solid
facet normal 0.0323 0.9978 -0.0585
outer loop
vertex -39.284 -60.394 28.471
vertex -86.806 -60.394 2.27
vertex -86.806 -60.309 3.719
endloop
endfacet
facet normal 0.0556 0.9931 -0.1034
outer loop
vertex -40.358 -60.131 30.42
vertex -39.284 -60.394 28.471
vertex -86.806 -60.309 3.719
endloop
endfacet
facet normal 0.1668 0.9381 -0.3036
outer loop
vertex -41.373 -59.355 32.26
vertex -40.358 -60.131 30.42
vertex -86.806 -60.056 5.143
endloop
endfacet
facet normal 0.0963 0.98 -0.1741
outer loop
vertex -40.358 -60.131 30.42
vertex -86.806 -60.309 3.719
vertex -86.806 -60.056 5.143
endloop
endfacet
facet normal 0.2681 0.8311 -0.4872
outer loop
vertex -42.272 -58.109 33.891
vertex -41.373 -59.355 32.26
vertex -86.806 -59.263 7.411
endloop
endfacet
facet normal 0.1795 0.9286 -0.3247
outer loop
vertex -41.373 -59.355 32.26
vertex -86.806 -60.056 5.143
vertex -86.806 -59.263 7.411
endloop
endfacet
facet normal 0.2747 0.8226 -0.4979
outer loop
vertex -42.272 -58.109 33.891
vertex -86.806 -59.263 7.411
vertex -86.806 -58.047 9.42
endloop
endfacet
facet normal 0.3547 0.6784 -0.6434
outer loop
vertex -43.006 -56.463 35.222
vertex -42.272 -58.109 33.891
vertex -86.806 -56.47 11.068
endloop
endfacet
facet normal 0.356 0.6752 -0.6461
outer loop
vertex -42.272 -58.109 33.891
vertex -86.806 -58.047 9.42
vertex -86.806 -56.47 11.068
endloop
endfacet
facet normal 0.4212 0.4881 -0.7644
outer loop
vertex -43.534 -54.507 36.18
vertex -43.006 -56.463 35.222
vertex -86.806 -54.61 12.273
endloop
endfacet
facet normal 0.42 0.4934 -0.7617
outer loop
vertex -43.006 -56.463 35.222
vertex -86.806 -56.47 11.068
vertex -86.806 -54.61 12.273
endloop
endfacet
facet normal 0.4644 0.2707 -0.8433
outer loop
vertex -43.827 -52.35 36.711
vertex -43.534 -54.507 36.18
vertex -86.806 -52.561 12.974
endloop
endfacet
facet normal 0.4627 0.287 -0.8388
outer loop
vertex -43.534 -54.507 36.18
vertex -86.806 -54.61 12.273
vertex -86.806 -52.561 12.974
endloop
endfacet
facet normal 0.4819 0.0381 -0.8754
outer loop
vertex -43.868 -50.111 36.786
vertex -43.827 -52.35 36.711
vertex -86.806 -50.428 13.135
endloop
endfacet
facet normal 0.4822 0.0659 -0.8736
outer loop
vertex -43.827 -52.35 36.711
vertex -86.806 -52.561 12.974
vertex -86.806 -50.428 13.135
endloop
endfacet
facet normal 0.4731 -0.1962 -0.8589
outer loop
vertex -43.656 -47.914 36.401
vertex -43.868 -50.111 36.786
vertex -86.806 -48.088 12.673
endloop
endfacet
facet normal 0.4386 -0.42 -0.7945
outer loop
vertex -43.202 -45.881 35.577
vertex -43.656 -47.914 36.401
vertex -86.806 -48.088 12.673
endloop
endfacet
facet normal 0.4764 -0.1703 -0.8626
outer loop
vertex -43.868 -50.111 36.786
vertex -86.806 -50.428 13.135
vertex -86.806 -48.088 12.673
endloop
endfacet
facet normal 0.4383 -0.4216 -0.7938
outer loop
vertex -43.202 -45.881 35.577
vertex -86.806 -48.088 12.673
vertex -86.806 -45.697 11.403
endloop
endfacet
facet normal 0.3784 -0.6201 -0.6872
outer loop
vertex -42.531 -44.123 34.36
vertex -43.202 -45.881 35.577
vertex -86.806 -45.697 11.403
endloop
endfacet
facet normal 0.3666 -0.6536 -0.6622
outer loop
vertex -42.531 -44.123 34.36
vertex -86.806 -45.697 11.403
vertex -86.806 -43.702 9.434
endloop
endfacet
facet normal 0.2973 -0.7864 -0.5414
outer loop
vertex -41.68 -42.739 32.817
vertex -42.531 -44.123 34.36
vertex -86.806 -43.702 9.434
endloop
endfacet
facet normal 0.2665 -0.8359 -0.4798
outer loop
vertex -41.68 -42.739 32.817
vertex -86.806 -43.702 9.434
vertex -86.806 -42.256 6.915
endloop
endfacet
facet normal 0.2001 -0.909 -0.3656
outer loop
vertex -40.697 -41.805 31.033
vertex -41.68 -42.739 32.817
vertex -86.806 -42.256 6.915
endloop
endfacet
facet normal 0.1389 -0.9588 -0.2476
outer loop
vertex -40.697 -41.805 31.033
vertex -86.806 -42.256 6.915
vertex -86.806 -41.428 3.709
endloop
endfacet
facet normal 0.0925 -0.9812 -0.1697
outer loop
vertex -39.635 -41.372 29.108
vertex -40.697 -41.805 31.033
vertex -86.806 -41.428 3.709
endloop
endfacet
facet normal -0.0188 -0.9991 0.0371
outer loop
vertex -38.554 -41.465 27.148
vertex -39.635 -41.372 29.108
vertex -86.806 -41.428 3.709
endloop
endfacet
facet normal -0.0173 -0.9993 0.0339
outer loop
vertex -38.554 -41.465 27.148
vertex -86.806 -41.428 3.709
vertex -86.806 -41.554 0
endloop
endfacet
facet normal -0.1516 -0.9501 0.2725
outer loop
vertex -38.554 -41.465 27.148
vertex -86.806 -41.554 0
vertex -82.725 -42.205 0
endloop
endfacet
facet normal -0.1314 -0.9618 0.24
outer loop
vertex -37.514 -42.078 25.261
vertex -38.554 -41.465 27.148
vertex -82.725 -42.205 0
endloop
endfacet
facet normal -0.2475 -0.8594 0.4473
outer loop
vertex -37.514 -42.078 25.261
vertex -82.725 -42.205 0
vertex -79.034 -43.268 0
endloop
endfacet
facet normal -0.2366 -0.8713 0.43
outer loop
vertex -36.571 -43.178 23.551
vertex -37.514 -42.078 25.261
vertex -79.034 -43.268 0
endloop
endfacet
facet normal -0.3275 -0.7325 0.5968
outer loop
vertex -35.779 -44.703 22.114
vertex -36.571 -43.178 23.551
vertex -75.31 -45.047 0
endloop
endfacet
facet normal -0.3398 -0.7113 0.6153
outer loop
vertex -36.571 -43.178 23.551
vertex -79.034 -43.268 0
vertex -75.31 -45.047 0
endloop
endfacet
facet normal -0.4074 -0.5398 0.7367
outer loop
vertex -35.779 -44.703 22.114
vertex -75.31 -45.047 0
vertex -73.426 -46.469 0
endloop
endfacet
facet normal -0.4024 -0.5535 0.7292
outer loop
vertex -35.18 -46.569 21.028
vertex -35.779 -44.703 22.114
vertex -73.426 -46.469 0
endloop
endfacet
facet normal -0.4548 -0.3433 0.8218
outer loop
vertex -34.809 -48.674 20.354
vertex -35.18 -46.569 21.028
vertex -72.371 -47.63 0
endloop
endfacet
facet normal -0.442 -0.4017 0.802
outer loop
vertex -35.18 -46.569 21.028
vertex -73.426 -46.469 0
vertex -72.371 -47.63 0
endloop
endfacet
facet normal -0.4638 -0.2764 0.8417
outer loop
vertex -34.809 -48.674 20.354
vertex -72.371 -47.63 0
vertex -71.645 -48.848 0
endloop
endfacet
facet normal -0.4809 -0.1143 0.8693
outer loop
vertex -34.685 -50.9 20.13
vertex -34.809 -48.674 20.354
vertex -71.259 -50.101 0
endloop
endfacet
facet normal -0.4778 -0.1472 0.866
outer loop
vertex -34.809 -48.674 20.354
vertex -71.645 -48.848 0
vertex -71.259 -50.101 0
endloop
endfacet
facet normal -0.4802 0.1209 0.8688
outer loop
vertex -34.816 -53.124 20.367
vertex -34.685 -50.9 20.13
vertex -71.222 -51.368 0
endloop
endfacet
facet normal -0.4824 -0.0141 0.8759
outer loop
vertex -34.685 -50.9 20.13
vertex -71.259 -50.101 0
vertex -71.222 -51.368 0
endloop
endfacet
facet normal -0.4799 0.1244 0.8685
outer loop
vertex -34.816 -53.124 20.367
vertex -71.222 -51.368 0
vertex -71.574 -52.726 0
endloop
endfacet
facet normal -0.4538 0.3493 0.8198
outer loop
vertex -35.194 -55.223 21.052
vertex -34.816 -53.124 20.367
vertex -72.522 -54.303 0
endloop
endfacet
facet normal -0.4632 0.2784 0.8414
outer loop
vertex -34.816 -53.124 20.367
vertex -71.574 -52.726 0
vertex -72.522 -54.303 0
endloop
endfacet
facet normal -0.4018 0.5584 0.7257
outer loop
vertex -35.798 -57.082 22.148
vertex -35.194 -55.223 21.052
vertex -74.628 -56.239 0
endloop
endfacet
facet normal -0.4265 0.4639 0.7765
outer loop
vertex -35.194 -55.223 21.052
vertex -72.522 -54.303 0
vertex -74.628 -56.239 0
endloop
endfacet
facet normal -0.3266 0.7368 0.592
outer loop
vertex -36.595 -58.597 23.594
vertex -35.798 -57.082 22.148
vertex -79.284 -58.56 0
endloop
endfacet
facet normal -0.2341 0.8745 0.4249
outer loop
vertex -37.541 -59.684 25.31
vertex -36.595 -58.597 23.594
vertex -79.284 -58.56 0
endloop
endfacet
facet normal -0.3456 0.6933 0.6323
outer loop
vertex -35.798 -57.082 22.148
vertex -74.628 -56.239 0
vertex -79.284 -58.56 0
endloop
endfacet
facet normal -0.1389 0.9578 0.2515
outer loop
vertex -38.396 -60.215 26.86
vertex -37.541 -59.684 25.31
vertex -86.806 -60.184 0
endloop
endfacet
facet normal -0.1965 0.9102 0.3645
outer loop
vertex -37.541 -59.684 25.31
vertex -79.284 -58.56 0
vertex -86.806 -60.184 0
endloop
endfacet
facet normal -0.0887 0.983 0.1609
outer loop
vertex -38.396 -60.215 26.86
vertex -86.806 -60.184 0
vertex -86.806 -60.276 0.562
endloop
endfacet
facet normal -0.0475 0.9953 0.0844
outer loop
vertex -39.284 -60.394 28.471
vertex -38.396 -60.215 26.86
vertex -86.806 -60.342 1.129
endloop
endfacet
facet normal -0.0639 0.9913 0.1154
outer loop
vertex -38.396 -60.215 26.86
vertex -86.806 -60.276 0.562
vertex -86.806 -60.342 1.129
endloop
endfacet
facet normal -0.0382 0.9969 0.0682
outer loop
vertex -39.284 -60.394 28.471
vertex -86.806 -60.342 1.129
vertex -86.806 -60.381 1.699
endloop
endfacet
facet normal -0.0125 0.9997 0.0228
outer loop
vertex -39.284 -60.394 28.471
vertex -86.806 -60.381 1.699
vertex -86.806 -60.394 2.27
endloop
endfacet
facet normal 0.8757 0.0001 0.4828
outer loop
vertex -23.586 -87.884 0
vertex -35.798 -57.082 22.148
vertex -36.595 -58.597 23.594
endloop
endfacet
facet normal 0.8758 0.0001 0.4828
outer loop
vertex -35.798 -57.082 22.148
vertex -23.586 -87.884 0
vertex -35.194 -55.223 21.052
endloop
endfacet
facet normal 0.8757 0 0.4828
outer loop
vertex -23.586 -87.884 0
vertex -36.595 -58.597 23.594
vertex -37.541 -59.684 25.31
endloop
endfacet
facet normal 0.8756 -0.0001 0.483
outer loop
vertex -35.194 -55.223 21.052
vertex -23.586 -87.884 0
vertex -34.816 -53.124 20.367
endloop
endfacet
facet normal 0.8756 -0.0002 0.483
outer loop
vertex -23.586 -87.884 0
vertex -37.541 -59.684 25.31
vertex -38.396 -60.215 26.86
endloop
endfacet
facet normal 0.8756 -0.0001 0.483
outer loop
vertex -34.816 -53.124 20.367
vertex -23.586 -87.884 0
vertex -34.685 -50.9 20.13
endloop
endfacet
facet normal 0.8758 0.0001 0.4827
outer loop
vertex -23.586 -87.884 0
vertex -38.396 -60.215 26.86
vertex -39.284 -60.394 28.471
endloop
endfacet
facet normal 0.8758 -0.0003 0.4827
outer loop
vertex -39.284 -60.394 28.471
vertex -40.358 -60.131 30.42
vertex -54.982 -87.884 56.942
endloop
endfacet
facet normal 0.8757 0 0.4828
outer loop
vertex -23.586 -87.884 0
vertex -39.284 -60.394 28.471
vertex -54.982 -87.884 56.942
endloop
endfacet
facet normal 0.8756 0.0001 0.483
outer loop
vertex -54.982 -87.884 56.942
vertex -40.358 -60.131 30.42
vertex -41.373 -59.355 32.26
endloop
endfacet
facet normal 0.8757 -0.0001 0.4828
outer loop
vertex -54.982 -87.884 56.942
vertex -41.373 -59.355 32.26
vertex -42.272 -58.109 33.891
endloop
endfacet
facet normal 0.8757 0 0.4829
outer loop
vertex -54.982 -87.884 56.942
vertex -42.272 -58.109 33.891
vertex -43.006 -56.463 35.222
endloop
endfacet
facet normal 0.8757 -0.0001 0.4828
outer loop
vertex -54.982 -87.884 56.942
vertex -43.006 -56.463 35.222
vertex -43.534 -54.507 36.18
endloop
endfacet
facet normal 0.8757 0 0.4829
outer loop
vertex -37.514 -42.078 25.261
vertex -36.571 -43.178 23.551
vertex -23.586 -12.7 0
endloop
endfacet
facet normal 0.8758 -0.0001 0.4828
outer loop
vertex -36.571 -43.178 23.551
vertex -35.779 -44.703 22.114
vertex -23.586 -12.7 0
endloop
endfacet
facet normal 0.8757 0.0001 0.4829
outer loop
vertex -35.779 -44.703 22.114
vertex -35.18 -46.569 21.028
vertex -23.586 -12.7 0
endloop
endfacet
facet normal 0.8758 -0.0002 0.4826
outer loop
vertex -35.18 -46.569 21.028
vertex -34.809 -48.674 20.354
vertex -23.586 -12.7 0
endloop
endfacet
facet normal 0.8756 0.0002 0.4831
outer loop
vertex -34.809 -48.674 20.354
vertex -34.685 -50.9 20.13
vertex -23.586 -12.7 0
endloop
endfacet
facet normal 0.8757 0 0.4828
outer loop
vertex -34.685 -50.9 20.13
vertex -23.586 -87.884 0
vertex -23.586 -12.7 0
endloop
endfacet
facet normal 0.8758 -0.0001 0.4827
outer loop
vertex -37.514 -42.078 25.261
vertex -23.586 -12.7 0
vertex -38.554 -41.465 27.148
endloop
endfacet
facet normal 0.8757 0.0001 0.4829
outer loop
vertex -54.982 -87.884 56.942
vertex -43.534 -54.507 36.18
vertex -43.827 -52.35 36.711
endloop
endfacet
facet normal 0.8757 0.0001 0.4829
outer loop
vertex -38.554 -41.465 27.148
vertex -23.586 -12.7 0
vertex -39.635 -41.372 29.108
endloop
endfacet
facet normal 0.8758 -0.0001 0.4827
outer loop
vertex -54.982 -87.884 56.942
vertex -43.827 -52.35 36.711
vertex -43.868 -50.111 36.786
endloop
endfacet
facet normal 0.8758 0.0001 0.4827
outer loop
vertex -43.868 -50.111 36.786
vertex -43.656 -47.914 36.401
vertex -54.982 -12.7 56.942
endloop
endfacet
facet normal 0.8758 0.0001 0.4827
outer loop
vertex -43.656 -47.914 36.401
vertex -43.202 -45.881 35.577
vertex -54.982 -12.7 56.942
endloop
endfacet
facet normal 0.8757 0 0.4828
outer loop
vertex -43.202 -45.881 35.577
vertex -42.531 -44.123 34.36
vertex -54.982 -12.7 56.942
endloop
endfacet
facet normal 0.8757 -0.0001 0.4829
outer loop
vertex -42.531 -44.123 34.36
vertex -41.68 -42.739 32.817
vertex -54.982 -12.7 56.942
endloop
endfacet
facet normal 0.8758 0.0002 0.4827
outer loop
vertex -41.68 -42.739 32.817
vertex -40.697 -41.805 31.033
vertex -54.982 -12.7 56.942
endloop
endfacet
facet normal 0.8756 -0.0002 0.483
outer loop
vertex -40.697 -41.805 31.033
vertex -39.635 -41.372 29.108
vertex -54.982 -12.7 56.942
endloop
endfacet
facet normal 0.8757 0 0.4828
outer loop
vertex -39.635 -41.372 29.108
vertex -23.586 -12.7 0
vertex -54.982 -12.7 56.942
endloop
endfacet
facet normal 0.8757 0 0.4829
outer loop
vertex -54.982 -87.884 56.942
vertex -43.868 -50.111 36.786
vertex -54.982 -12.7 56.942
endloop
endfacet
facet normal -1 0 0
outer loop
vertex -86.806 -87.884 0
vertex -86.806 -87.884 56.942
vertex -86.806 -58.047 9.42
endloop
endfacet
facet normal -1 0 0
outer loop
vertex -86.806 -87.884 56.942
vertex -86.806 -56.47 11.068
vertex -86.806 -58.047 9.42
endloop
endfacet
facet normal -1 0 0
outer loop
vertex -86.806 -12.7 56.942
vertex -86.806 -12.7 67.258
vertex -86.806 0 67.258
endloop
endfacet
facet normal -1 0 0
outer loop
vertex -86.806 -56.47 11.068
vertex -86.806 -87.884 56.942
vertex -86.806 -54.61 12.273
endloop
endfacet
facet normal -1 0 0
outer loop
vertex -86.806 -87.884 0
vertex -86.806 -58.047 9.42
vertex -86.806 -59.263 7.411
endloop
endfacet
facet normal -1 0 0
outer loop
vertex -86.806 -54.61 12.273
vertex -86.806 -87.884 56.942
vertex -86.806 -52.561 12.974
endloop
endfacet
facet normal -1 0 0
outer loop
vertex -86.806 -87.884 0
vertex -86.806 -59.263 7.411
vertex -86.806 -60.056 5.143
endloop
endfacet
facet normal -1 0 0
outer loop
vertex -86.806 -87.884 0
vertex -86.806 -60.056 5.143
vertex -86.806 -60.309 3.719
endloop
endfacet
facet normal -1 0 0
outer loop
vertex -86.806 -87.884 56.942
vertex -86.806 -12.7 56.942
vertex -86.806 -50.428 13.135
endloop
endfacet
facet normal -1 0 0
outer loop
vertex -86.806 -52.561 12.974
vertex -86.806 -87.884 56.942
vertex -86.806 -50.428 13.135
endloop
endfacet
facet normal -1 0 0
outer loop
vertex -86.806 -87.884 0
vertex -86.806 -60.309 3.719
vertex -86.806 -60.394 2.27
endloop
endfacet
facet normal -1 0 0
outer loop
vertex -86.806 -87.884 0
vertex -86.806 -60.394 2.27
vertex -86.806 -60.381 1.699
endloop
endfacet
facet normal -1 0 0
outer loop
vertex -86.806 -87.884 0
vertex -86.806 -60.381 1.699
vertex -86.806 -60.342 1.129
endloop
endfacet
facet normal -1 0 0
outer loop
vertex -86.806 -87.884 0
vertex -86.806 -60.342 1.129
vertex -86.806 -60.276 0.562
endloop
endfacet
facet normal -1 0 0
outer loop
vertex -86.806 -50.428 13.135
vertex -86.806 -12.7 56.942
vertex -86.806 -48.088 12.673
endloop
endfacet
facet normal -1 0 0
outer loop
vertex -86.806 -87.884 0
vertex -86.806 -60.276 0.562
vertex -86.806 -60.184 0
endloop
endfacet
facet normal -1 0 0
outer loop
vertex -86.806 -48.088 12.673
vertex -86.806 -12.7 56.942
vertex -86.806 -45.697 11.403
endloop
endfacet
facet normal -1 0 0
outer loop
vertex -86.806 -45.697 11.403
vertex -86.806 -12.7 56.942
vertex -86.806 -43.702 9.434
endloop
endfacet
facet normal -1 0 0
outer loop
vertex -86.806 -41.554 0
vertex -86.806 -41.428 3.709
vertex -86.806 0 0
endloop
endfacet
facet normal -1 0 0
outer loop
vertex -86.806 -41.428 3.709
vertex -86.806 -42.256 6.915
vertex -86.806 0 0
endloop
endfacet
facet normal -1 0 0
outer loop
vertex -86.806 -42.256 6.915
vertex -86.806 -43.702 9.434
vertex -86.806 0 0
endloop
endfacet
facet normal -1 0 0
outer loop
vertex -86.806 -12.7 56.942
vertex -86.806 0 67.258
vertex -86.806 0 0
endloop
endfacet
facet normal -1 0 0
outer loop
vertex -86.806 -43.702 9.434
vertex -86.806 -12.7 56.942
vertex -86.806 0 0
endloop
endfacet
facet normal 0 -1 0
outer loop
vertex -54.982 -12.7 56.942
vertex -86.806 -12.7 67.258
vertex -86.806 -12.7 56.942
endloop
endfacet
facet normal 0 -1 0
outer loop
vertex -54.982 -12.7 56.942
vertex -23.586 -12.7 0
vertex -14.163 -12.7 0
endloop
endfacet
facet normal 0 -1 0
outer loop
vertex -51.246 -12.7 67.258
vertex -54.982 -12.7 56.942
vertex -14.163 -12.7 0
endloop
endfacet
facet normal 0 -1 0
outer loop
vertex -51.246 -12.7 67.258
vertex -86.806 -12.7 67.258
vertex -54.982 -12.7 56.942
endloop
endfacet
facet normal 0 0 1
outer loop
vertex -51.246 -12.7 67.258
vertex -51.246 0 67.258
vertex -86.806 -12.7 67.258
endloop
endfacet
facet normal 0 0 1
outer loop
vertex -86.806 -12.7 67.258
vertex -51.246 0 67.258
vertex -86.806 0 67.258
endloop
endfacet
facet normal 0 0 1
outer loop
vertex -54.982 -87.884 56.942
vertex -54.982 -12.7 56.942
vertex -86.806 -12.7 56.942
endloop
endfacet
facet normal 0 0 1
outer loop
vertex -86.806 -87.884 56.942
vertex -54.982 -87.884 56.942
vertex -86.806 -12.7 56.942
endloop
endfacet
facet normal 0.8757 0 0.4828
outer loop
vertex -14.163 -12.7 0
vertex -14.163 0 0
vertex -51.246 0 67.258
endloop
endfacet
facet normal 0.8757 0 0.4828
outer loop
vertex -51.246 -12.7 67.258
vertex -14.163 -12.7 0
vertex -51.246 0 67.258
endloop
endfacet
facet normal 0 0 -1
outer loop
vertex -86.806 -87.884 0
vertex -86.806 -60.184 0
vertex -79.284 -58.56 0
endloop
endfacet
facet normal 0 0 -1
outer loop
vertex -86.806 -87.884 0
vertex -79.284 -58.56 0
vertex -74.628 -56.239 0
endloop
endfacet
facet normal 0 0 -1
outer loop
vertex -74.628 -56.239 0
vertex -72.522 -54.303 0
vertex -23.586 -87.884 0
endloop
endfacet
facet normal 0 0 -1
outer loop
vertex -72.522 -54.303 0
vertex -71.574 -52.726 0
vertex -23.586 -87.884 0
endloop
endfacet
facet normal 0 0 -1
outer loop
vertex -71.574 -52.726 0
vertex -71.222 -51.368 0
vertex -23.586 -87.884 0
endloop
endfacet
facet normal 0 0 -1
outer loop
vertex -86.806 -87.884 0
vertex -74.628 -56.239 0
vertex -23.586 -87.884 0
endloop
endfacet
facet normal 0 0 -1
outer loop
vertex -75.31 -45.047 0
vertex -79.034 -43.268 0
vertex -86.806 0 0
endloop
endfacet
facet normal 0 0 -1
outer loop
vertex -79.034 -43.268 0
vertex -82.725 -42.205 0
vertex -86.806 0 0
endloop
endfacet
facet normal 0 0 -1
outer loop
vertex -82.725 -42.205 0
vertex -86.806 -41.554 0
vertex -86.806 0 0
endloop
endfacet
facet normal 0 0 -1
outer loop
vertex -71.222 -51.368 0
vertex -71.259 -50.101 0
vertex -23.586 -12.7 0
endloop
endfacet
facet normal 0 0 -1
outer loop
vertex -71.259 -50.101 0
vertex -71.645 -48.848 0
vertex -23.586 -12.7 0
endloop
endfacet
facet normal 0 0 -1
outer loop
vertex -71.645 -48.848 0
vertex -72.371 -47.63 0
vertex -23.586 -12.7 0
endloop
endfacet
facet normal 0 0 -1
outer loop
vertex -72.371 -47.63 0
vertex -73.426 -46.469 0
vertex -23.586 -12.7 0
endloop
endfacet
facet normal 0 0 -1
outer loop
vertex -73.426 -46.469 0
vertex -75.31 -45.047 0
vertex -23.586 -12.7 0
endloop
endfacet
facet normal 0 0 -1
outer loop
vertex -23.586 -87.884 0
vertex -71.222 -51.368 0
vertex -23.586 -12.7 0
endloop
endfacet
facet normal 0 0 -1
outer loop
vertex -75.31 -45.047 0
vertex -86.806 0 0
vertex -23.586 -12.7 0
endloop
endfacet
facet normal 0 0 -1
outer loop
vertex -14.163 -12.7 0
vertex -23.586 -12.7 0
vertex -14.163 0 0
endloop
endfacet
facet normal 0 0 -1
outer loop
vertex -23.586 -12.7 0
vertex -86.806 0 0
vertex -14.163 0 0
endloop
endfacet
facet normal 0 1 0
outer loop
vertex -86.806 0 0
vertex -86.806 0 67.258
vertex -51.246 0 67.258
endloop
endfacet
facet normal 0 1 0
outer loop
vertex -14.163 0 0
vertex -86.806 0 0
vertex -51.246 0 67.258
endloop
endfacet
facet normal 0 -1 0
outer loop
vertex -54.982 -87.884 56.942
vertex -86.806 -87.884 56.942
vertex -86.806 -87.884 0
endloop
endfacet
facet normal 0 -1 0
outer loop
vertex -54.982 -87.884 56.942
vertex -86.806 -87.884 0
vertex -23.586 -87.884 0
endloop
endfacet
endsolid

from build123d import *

# Parameters (mm, degrees)
F1_DEPTH = 12.7
F3_DEPTH = 75.184
F5_D     = 19.05


with BuildPart() as f1:
    # F0 (on Front) → F1 (new body)
    with BuildSketch(Plane.XZ):
        Polygon((-86.805733, 67.25759), (-86.805733, 0), (-14.163172, 0), (-51.245734, 67.25759), align=None)
    extrude(amount=F1_DEPTH)

    # F2 (on face) → F3 (join)
    with BuildSketch(Plane.XZ.offset(12.7)):
        Polygon((-54.981604, 56.942139), (-86.805733, 56.942139), (-86.805733, 0), (-23.58648, 0), align=None)
    extrude(amount=F3_DEPTH)

    # F5 (through all)
    with Locations(Plane(origin=(-18.087953, 0, -9.972817), x_dir=(0, 1, 0), z_dir=(0.875716, 0, 0.482827))):
        with Locations((-50.869141, 43.899961)):
            Hole(F5_D / 2)


solid = f1.part
